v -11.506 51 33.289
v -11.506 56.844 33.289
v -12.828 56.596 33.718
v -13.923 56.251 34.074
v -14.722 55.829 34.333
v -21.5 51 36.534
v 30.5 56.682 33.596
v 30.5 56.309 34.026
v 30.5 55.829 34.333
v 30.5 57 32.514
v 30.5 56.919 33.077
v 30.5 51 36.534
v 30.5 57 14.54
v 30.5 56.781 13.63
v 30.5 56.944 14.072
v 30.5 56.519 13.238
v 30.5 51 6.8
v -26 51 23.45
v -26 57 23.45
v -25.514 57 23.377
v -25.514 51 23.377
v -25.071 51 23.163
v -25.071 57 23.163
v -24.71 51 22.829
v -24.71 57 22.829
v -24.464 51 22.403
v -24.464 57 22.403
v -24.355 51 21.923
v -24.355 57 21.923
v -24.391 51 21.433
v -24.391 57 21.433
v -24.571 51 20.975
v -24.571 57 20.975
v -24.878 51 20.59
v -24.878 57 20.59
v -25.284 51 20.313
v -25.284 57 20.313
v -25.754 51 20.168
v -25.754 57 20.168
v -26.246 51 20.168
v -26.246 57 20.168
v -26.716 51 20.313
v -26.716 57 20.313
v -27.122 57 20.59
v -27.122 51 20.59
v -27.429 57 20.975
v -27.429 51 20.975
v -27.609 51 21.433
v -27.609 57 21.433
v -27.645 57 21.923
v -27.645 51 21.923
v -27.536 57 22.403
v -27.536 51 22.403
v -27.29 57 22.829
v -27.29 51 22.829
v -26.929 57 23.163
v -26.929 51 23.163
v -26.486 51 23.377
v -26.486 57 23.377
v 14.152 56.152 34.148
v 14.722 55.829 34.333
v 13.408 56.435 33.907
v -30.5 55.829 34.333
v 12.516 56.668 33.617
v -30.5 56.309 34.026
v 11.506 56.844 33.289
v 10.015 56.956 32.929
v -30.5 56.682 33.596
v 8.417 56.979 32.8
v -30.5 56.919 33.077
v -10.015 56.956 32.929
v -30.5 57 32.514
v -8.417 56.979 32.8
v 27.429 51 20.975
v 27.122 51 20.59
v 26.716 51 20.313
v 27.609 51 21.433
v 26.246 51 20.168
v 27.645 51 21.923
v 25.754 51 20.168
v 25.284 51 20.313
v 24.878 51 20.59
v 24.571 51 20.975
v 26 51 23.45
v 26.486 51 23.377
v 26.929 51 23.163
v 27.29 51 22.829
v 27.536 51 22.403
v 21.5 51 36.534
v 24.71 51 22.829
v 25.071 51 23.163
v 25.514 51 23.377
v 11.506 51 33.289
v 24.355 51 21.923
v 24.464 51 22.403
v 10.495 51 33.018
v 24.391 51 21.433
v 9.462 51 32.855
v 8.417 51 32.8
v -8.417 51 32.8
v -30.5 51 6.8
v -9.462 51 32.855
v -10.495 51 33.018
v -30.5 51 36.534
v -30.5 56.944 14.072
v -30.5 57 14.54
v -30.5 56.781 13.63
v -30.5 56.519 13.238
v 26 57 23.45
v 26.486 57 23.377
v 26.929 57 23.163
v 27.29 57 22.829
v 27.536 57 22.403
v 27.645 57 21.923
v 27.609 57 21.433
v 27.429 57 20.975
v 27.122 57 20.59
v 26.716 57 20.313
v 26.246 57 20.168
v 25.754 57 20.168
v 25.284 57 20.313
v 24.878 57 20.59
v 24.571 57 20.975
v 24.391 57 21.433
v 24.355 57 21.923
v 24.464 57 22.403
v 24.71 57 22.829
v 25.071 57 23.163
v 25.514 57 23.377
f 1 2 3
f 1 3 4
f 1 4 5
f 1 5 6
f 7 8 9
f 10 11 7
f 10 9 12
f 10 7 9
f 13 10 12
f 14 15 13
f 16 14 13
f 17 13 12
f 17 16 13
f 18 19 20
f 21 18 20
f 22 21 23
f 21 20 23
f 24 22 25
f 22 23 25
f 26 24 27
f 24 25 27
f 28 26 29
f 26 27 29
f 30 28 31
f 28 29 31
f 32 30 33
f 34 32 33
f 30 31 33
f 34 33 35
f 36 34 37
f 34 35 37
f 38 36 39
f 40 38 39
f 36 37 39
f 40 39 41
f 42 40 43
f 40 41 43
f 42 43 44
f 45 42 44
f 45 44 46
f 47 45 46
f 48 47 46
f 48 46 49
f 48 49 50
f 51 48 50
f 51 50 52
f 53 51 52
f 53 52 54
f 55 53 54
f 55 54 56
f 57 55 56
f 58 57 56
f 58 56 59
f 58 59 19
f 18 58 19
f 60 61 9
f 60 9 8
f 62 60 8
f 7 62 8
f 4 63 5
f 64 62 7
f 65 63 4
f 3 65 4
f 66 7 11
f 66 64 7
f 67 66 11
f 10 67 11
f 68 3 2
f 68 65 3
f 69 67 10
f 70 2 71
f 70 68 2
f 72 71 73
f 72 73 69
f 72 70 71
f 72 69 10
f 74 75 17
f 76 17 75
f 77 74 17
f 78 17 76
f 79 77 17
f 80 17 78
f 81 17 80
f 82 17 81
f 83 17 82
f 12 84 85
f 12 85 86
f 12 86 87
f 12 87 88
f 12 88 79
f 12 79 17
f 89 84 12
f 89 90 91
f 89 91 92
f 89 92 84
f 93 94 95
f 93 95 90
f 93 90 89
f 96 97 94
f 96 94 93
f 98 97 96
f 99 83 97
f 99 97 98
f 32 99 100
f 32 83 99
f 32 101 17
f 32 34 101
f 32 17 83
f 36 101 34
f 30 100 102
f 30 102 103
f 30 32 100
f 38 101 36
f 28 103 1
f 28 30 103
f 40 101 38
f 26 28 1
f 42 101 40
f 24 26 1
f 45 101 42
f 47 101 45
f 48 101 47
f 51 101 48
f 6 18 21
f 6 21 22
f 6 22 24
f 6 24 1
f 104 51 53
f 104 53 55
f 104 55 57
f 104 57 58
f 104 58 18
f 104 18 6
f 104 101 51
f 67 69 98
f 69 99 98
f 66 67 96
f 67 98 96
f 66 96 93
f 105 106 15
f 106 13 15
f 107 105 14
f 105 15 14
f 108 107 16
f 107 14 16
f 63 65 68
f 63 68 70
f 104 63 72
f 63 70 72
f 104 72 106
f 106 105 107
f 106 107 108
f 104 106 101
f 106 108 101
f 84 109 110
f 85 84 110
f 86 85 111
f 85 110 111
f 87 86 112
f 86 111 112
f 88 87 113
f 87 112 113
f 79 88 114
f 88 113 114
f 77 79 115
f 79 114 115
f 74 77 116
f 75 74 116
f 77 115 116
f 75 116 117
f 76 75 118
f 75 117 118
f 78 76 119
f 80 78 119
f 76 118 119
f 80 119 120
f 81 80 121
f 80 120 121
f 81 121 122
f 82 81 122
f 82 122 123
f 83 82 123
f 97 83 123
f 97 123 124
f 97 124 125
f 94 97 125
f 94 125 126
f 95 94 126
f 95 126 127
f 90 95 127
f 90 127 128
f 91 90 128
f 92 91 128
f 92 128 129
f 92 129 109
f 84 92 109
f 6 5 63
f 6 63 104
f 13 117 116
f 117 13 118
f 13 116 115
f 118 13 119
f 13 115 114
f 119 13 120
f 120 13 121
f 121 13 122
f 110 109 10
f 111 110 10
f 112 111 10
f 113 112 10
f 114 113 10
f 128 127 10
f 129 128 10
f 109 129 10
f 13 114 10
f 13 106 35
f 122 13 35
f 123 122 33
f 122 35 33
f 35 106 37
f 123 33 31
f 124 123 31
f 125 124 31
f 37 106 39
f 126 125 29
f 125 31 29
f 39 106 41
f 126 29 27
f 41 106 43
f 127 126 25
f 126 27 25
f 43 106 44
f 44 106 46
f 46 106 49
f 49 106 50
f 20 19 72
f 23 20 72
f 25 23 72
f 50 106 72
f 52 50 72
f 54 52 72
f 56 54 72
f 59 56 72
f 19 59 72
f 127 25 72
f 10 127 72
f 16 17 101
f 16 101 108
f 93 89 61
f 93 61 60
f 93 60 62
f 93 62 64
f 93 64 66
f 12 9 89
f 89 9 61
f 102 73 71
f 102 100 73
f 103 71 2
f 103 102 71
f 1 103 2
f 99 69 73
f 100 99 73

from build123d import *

# Parameters (mm, degrees)
SKETCH1_R                      = 10.999999999999991
SKETCH1_R_2                    = 1.5500000000000034
SKETCH1_R_3                    = 1.5500000000000018
SKETCH1_R_4                    = 1.5499999999999992
SKETCH1_R_5                    = 1.5500000000000012
BOSS_EXTRUDE1_DEPTH            = 2.8
SKETCH2_R                      = 1.5499999999999992
SKETCH2_R_2                    = 1.5500000000000005
SKETCH2_R_3                    = 1.5500000000000034
SKETCH2_R_4                    = 1.5500000000000018
BOSS_EXTRUDE2_DEPTH            = 8
SKETCH3_R                      = 2.75
SKETCH3_R_2                    = 2.749999999999998
SKETCH3_R_3                    = 2.7500000000000044
SKETCH3_R_4                    = 2.7500000000000036
CUT_EXTRUDE1_DEPTH             = 3.6
SKETCH4_W                      = 13.999999999999996
SKETCH4_H                      = 24
BOSS_EXTRUDE3_DEPTH            = 9
CUT_EXTRUDE3_DEPTH             = 92.05990830217213
CHAMFER1_SIZE                  = 2.4
BOSS_EXTRUDE4_START            = -21.5
BOSS_EXTRUDE4_DEPTH            = 43
SKETCH5_R                      = 1.6499999999999986
SKETCH5_R_2                    = 1.6500000000000061
CUT_EXTRUDE2_DEPTH             = 18
CUT_EXTRUDE4_DEPTH             = 2.8
CHAMFER2_SIZE                  = 1
CHAMFER3_SIZE                  = 1
FILLET1_R                      = 2
CHAMFER4_SIZE                  = 2
CHAMFER5_SIZE                  = 0.4
CHAMFER6_SIZE                  = 0.4
CUT_EXTRUDE6_REACH             = 93.06
CUT_EXTRUDE6_DIRECTION_2_DEPTH = 92.05990830217215
CUT_EXTRUDE5_DEPTH             = 92.05990830217213
CUT_EXTRUDE5_DEPTH_BACK        = 92.05990830217213
FILLET2_R                      = 10


# Read off the part's stored shape, not the designer's step: Mirror1
with BuildPart() as part:
    # Sketch1 → Boss-Extrude1 (new body)
    with BuildSketch(Plane.XY):
        Polygon((-21.499999999999996, 51), (21.499999999999996, 51), (21.5, 8), (-21.5, 8), align=None)
        with Locations((0, 29.5)):
            Circle(SKETCH1_R, mode=Mode.SUBTRACT)
        with Locations((-15.5, 45)):
            Circle(SKETCH1_R_2, mode=Mode.SUBTRACT)
        with Locations((15.5, 45)):
            Circle(SKETCH1_R_3, mode=Mode.SUBTRACT)
        with Locations((-15.5, 14.000000000000005)):
            Circle(SKETCH1_R_4, mode=Mode.SUBTRACT)
        with Locations((15.5, 14.000000000000005)):
            Circle(SKETCH1_R_5, mode=Mode.SUBTRACT)
    extrude(amount=BOSS_EXTRUDE1_DEPTH)

    # Sketch2 → Boss-Extrude2 (add)
    with BuildSketch(Plane(origin=(0, 0, 0), x_dir=(1, 0, 0), z_dir=(0, 1, 0))):
        with BuildLine():
            Line((-21.5, 0), (21.5, 0))
            Line((21.5, 0), (21.5, -56.13000000000001))
            Line((21.5, -56.13000000000001), (12.052422437019597, -62.83770289976113))
            ThreePointArc((12.052422437019597, -62.83770289976113), (10.126743955166411, -63.79910489864743), (8.000000000000245, -64.12999999999994))
            Line((8.000000000000245, -64.12999999999994), (-7.999999999999807, -64.13))
            ThreePointArc((-7.999999999999807, -64.13), (-10.126743955165974, -63.7991048986475), (-12.052422437019167, -62.83770289976122))
            Line((-12.052422437019167, -62.83770289976122), (-21.49999999999961, -56.13000000000015))
            Line((-21.49999999999961, -56.13000000000015), (-21.5, 0))
        make_face()
        with Locations(Location((8.00000000000003, -8.800000000000002, 0), (0, 0, 270))):
            Circle(SKETCH2_R, mode=Mode.SUBTRACT)
        with Locations(Location((-7.999999999999971, -8.800000000000054, 0), (0, 0, 270))):
            Circle(SKETCH2_R_2, mode=Mode.SUBTRACT)
        with Locations(Location((-7.999999999999804, -57.13000000000005, 0), (0, 0, 270))):
            Circle(SKETCH2_R_3, mode=Mode.SUBTRACT)
        with Locations(Location((8.000000000000195, -57.13, 0), (0, 0, 270))):
            Circle(SKETCH2_R_4, mode=Mode.SUBTRACT)
        with BuildLine():
            Line((15.912505911952584, -21.89324240011998), (3.312505911952694, -31.19069648889579))
            ThreePointArc((3.312505911952694, -31.19069648889579), (2.5001050442102857, -32.779502053609654), (3.2797696996303043, -34.38462551224556))
            Line((3.2797696996303043, -34.38462551224556), (15.87976969963019, -44.08717142346975))
            ThreePointArc((15.87976969963019, -44.08717142346975), (17.983045695097484, -44.297045925258715), (19.099999999999998, -42.50254591122421))
            Line((19.099999999999998, -42.50254591122421), (19.1, -23.50254591122421))
            ThreePointArc((19.1, -23.50254591122421), (18.001391098221283, -21.717190459767167), (15.912505911952584, -21.89324240011998))
        make_face(mode=Mode.SUBTRACT)
        with BuildLine():
            Line((10.520825659408167, -19.409303511104177), (1.1874940880475682, -26.2963052396794))
            ThreePointArc((1.1874940880475682, -26.2963052396794), (9.102e-14, -26.687001728575183), (-1.1874940880473879, -26.296305239679405))
            Line((-1.1874940880473879, -26.296305239679405), (-10.520825659408036, -19.40930351110425))
            ThreePointArc((-10.520825659408036, -19.40930351110425), (-11.233148275967746, -17.17494281149982), (-9.333331571360638, -15.800000000000061))
            Line((-9.333331571360638, -15.800000000000061), (9.333331571360745, -15.799999999999999))
            ThreePointArc((9.333331571360745, -15.799999999999999), (11.233148275967867, -17.17494281149974), (10.520825659408167, -19.409303511104177))
        make_face(mode=Mode.SUBTRACT)
        with BuildLine():
            Line((1.2202303003699406, -39.36175579272474), (10.553561871730695, -46.548825481280836))
            ThreePointArc((10.553561871730695, -46.548825481280836), (11.226642299225048, -48.77794652318848), (9.333331571360894, -50.13345099352635))
            Line((9.333331571360894, -50.13345099352635), (-9.33333157136048, -50.133450993526345))
            ThreePointArc((-9.33333157136048, -50.133450993526345), (-11.226642299224643, -48.7779465231885), (-10.553561871730299, -46.548825481280836))
            Line((-10.553561871730299, -46.548825481280836), (-1.2202303003696755, -39.36175579272474))
            ThreePointArc((-1.2202303003696755, -39.36175579272474), (1.3436e-13, -38.946381304970274), (1.2202303003699406, -39.36175579272474))
        make_face(mode=Mode.SUBTRACT)
        with BuildLine():
            Line((-3.2797696996300685, -34.384625512245584), (-15.879769699629884, -44.087171423469854))
            ThreePointArc((-15.879769699629884, -44.087171423469854), (-17.98304569509718, -44.297045925258836), (-19.099999999999707, -42.50254591122434))
            Line((-19.099999999999707, -42.50254591122434), (-19.099999999999834, -23.502545911224342))
            ThreePointArc((-19.099999999999834, -23.502545911224342), (-18.00139109822113, -21.71719045976729), (-15.912505911952431, -21.893242400120087))
            Line((-15.912505911952431, -21.893242400120087), (-3.31250591195248, -31.190696488895814))
            ThreePointArc((-3.31250591195248, -31.190696488895814), (-2.500105044210054, -32.779502053609676), (-3.2797696996300685, -34.384625512245584))
        make_face(mode=Mode.SUBTRACT)
    extrude(amount=BOSS_EXTRUDE2_DEPTH)

    # Sketch3 → Cut-Extrude1 (cut)
    with BuildSketch(Plane(origin=(0, 8, 0), x_dir=(1, 0, 0), z_dir=(0, 1, 0))):
        with Locations(Location((-7.999999999999971, -8.800000000000054, 0), (0, 0, 270))):
            Circle(SKETCH3_R)
        with Locations(Location((8.00000000000003, -8.800000000000002, 0), (0, 0, 270))):
            Circle(SKETCH3_R_2)
        with Locations(Location((-7.999999999999804, -57.13000000000005, 0), (0, 0, 270))):
            Circle(SKETCH3_R_3)
        with Locations(Location((8.000000000000195, -57.13, 0), (0, 0, 270))):
            Circle(SKETCH3_R_4)
    extrude(amount=-CUT_EXTRUDE1_DEPTH, mode=Mode.SUBTRACT)

    # Sketch4 → Boss-Extrude3 (add)
    # profile 1 of 2: a face of its own
    with BuildSketch(Plane(origin=(21.5, 1.73e-15, 0), x_dir=(0, 0, -1), z_dir=(1, 0, 0))):
        Polygon((-2.8, 8), (-2.8, 51), (-6.800000000000001, 51), (-13.799999999999999, 56.99999999999999), (-33.8, 57), (-56.13000000000001, 8.000000000000007), align=None)
        with Locations((-21.79999999999999, 26.999999999999993)):
            Rectangle(SKETCH4_W, SKETCH4_H, mode=Mode.SUBTRACT)
    # profile 2 of 2: a face of its own
    with BuildSketch(Plane(origin=(21.5, 1.73e-15, 0), x_dir=(0, 0, -1), z_dir=(1, 0, 0))):
        Polygon((0, 51), (-2.8, 51), (-2.8, 8), (-56.13000000000001, 8.000000000000007), (-56.13000000000001, 0), (0, 0), align=None)
    extrude(amount=BOSS_EXTRUDE3_DEPTH)

    # Sketch6 → Cut-Extrude3 (cut, through all)
    with BuildSketch(Plane.XZ):
        with BuildLine():
            Line((30.5, 56.13000000000001), (21.5, 56.13000000000001))
            Line((21.5, 56.13000000000001), (27.131339928022157, 52.13179464916522))
            ThreePointArc((27.131339928022157, 52.13179464916522), (29.60811928094123, 49.27948759313254), (30.5, 45.60870562086678))
            Line((30.5, 45.60870562086678), (30.5, 56.13000000000001))
        make_face()
    extrude(amount=-CUT_EXTRUDE3_DEPTH, mode=Mode.SUBTRACT)

    # Chamfer1
    # the kernel refuses this chamfer: 2.4 mm, written as the material it adds along each edge
    with BuildSketch(Plane(origin=(21.5, 8, 2.8), x_dir=(-0.9996219169112968, -0.027495876610586303, 0), z_dir=(0, 0, 1))) as chamfer1_piece_1_section:
        Polygon((CHAMFER1_SIZE * 0.999621916911, -CHAMFER1_SIZE * 0.0274958766106), (-CHAMFER1_SIZE * 0.0274958766106, -CHAMFER1_SIZE * 0.999621916911), (0, 0), align=None)
    chamfer1_piece_1 = extrude(amount=59.502039171118206, mode=Mode.PRIVATE)
    chamfer1_piece_1 = split(chamfer1_piece_1, bisect_by=Plane(origin=(20.6986233607906, 18.79069033848495, 51.212528260033295), z_dir=(0, -0.4146842236388121, -0.9099653810256058)), keep=Keep.TOP, mode=Mode.PRIVATE)
    add(chamfer1_piece_1)

    # Mirror1: part across plane


with BuildPart() as part_1:
    add(part.part)
    add(part.part.mirror(Plane(origin=(0, 0, 0), x_dir=(0, 0, 1), z_dir=(1, 0, 0))))

    # Sketch7 → Boss-Extrude4 (add)
    with BuildSketch(Plane(origin=(0, 0, 0), x_dir=(0, 0, -1), z_dir=(1, 0, 0)).offset(BOSS_EXTRUDE4_START)):
        Polygon((-36.53428571428571, 50.99999999999999), (-6.800000000000001, 51), (-13.799999999999999, 56.99999999999999), (-33.8, 57), align=None)
    extrude(amount=BOSS_EXTRUDE4_DEPTH)

    # Sketch5 → Cut-Extrude2 (cut)
    with BuildSketch(Plane(origin=(0, 56.999999999999986, -1.978e-14), x_dir=(1, 0, 0), z_dir=(0, 1, 0))):
        with Locations(Location((26, -21.8, 0), (0, 0, 270))):
            Circle(SKETCH5_R)
        with Locations(Location((-26, -21.8, 0), (0, 0, 270))):
            Circle(SKETCH5_R_2)
    extrude(amount=-CUT_EXTRUDE2_DEPTH, mode=Mode.SUBTRACT)

    # Sketch9 → Cut-Extrude4 (cut)
    with BuildSketch(Plane.XZ.offset(-38.99999999999999)):
        Polygon((26, 18.566838492538096), (28.800000000000004, 20.183419246269047), (28.800000000000008, 23.416580753730955), (26.00000000000001, 25.03316150746191), (23.200000000000003, 23.416580753730955), (23.2, 20.18341924626905), align=None)
        Polygon((-26, 18.566838492538096), (-28.800000000000004, 20.183419246269047), (-28.800000000000008, 23.416580753730955), (-26.00000000000001, 25.03316150746191), (-23.200000000000003, 23.416580753730955), (-23.2, 20.18341924626905), align=None)
    extrude(amount=-CUT_EXTRUDE4_DEPTH, mode=Mode.SUBTRACT)

    # Chamfer2
    chamfer2_edges = [part_1.edges().sort_by_distance(p)[0] for p in [
        (30.5, 1.73e-15, 22.804352810433386),
        (29.60811928094123, 0, 49.27948759313254),
        (-30.5, 1.73e-15, 22.804352810433386),
        (-29.60811928094123, 0, 49.27948759313254),
        (-10.12674395516598, 8, 63.7991048986475),
        (2.1849e-13, 0, 64.12999999999997),
        (10.126743955166415, 0, 63.79910489864743),
        (19.59188118252077, 0, 57.4847487744632),
        (-16.77621121850939, 8, 59.48385144988068),
        (-10.12674395516598, 0, 63.7991048986475),
        (-19.59188118252077, 0, 57.4847487744632),
        (2.1849e-13, 8, 64.12999999999997),
        (10.126743955166415, 8, 63.79910489864743),
        (16.7762112185098, 8, 59.483851449880575),
    ]]
    chamfer(chamfer2_edges, length=CHAMFER2_SIZE)

    # Chamfer3
    chamfer3_edges = [part_1.edges().sort_by_distance(p)[0] for p in [
        (30.5, 51, 3.4000000000000004),
        (-30.5, 51, 3.4000000000000004),
    ]]
    chamfer(chamfer3_edges, length=CHAMFER3_SIZE)

    # Fillet1
    fillet1_edges = [part_1.edges().sort_by_distance(p)[0] for p in [
        (0, 57, 33.8),
        (0, 56.99999999999999, 13.799999999999999),
    ]]
    fillet(fillet1_edges, radius=FILLET1_R)

    # Chamfer4
    chamfer4_edges = [part_1.edges().sort_by_distance(p)[0] for p in [
        (30.5, 26.999999999999993, 14.799999999999994),
        (30.5, 14.999999999999995, 21.799999999999994),
        (26, 14.999999999999995, 14.799999999999994),
        (30.5, 26.999999999999993, 28.799999999999994),
        (26, 14.999999999999995, 28.799999999999994),
        (21.5, 26.999999999999993, 28.799999999999994),
        (21.5, 14.999999999999995, 21.799999999999994),
        (21.5, 26.999999999999993, 14.799999999999994),
        (-21.5, 26.999999999999993, 28.799999999999994),
        (-21.5, 14.999999999999995, 21.799999999999994),
        (-26, 14.999999999999995, 28.799999999999994),
        (-21.5, 26.999999999999993, 14.799999999999994),
        (-26, 14.999999999999995, 14.799999999999994),
        (-30.5, 26.999999999999993, 28.799999999999994),
        (-30.5, 14.999999999999995, 21.799999999999994),
        (-30.5, 26.999999999999993, 14.799999999999994),
    ]]
    chamfer(chamfer4_edges, length=CHAMFER4_SIZE)

    # Chamfer5
    chamfer5_edges = [part_1.edges().sort_by_distance(p)[0] for p in [
        (-10.999999999999993, 29.500000000000007, 2.8),
    ]]
    chamfer(chamfer5_edges, length=CHAMFER5_SIZE)

    # Chamfer6
    chamfer6_edges = [part_1.edges().sort_by_distance(p)[0] for p in [
        (8.00000000000003, 8, 6.050000000000004),
        (-7.999999999999802, 8, 54.380000000000045),
        (8.000000000000195, 8, 54.379999999999995),
        (-7.999999999999969, 8, 6.050000000000054),
    ]]
    chamfer(chamfer6_edges, length=CHAMFER6_SIZE)

    # Cut-Extrude6: up to this face of the body (flat: up to its plane)
    cut_extrude6_end = Plane(part_1.part.faces().sort_by_distance((0, 51, 21.667142857))[0])
    # Sketch10 → Cut-Extrude6 (cut, up to the picked face)
    with BuildSketch(Plane(origin=(0, 56.999999999999986, -1.978e-14), x_dir=(1, 0, 0), z_dir=(0, 1, 0)), mode=Mode.PRIVATE) as cut_extrude6_sk1:
        Polygon((21.499999999999964, -36.53428571428573), (10, -32.79999999999994), (-10, -32.79999999999994), (-21.499999999999964, -36.53428571428573), align=None)
    cut_extrude6_tool1 = split(extrude(cut_extrude6_sk1.sketch, amount=-CUT_EXTRUDE6_REACH, mode=Mode.PRIVATE), bisect_by=cut_extrude6_end, keep=Keep.BOTH, mode=Mode.PRIVATE)
    add(cut_extrude6_tool1.solids().sort_by(Axis((0, 57, 34.894361), (0, -1, 0)))[0], mode=Mode.SUBTRACT)

    # Sketch10 → Cut-Extrude6 direction 2 (cut)
    with BuildSketch(Plane(origin=(0, 56.999999999999986, -1.978e-14), x_dir=(1, 0, 0), z_dir=(0, 1, 0))):
        Polygon((21.499999999999964, -36.53428571428573), (10, -32.79999999999994), (-10, -32.79999999999994), (-21.499999999999964, -36.53428571428573), align=None)
    extrude(amount=CUT_EXTRUDE6_DIRECTION_2_DEPTH, mode=Mode.SUBTRACT)

    # Sketch8 → Cut-Extrude5 (cut, two sides: drawn at the far end of the back side and taken through both)
    with BuildSketch(Plane(origin=(0, 0, 0), x_dir=(0, 0, -1), z_dir=(1, 0, 0)).offset(-CUT_EXTRUDE5_DEPTH_BACK)):
        Polygon((-6.800000000000001, 51), (-200, 50.99999999999998), (-200, 48.99999999999997), (-6.800000000000001, 48.99999999999999), align=None)
        Polygon((0, 51), (-6.800000000000001, 51), (-6.800000000000001, 48.99999999999999), (-200, 48.99999999999997), (-200, -2.449e-14), (0, 0), align=None)
    extrude(amount=CUT_EXTRUDE5_DEPTH + CUT_EXTRUDE5_DEPTH_BACK, mode=Mode.SUBTRACT)

    # Fillet2
    fillet2_edges = [part_1.edges().sort_by_distance(p)[0] for p in [
        (-10, 53.98968962932255, 32.79999999999992),
        (10, 53.98968962932255, 32.79999999999992),
    ]]
    fillet(fillet2_edges, radius=FILLET2_R)


solid = part_1.part
